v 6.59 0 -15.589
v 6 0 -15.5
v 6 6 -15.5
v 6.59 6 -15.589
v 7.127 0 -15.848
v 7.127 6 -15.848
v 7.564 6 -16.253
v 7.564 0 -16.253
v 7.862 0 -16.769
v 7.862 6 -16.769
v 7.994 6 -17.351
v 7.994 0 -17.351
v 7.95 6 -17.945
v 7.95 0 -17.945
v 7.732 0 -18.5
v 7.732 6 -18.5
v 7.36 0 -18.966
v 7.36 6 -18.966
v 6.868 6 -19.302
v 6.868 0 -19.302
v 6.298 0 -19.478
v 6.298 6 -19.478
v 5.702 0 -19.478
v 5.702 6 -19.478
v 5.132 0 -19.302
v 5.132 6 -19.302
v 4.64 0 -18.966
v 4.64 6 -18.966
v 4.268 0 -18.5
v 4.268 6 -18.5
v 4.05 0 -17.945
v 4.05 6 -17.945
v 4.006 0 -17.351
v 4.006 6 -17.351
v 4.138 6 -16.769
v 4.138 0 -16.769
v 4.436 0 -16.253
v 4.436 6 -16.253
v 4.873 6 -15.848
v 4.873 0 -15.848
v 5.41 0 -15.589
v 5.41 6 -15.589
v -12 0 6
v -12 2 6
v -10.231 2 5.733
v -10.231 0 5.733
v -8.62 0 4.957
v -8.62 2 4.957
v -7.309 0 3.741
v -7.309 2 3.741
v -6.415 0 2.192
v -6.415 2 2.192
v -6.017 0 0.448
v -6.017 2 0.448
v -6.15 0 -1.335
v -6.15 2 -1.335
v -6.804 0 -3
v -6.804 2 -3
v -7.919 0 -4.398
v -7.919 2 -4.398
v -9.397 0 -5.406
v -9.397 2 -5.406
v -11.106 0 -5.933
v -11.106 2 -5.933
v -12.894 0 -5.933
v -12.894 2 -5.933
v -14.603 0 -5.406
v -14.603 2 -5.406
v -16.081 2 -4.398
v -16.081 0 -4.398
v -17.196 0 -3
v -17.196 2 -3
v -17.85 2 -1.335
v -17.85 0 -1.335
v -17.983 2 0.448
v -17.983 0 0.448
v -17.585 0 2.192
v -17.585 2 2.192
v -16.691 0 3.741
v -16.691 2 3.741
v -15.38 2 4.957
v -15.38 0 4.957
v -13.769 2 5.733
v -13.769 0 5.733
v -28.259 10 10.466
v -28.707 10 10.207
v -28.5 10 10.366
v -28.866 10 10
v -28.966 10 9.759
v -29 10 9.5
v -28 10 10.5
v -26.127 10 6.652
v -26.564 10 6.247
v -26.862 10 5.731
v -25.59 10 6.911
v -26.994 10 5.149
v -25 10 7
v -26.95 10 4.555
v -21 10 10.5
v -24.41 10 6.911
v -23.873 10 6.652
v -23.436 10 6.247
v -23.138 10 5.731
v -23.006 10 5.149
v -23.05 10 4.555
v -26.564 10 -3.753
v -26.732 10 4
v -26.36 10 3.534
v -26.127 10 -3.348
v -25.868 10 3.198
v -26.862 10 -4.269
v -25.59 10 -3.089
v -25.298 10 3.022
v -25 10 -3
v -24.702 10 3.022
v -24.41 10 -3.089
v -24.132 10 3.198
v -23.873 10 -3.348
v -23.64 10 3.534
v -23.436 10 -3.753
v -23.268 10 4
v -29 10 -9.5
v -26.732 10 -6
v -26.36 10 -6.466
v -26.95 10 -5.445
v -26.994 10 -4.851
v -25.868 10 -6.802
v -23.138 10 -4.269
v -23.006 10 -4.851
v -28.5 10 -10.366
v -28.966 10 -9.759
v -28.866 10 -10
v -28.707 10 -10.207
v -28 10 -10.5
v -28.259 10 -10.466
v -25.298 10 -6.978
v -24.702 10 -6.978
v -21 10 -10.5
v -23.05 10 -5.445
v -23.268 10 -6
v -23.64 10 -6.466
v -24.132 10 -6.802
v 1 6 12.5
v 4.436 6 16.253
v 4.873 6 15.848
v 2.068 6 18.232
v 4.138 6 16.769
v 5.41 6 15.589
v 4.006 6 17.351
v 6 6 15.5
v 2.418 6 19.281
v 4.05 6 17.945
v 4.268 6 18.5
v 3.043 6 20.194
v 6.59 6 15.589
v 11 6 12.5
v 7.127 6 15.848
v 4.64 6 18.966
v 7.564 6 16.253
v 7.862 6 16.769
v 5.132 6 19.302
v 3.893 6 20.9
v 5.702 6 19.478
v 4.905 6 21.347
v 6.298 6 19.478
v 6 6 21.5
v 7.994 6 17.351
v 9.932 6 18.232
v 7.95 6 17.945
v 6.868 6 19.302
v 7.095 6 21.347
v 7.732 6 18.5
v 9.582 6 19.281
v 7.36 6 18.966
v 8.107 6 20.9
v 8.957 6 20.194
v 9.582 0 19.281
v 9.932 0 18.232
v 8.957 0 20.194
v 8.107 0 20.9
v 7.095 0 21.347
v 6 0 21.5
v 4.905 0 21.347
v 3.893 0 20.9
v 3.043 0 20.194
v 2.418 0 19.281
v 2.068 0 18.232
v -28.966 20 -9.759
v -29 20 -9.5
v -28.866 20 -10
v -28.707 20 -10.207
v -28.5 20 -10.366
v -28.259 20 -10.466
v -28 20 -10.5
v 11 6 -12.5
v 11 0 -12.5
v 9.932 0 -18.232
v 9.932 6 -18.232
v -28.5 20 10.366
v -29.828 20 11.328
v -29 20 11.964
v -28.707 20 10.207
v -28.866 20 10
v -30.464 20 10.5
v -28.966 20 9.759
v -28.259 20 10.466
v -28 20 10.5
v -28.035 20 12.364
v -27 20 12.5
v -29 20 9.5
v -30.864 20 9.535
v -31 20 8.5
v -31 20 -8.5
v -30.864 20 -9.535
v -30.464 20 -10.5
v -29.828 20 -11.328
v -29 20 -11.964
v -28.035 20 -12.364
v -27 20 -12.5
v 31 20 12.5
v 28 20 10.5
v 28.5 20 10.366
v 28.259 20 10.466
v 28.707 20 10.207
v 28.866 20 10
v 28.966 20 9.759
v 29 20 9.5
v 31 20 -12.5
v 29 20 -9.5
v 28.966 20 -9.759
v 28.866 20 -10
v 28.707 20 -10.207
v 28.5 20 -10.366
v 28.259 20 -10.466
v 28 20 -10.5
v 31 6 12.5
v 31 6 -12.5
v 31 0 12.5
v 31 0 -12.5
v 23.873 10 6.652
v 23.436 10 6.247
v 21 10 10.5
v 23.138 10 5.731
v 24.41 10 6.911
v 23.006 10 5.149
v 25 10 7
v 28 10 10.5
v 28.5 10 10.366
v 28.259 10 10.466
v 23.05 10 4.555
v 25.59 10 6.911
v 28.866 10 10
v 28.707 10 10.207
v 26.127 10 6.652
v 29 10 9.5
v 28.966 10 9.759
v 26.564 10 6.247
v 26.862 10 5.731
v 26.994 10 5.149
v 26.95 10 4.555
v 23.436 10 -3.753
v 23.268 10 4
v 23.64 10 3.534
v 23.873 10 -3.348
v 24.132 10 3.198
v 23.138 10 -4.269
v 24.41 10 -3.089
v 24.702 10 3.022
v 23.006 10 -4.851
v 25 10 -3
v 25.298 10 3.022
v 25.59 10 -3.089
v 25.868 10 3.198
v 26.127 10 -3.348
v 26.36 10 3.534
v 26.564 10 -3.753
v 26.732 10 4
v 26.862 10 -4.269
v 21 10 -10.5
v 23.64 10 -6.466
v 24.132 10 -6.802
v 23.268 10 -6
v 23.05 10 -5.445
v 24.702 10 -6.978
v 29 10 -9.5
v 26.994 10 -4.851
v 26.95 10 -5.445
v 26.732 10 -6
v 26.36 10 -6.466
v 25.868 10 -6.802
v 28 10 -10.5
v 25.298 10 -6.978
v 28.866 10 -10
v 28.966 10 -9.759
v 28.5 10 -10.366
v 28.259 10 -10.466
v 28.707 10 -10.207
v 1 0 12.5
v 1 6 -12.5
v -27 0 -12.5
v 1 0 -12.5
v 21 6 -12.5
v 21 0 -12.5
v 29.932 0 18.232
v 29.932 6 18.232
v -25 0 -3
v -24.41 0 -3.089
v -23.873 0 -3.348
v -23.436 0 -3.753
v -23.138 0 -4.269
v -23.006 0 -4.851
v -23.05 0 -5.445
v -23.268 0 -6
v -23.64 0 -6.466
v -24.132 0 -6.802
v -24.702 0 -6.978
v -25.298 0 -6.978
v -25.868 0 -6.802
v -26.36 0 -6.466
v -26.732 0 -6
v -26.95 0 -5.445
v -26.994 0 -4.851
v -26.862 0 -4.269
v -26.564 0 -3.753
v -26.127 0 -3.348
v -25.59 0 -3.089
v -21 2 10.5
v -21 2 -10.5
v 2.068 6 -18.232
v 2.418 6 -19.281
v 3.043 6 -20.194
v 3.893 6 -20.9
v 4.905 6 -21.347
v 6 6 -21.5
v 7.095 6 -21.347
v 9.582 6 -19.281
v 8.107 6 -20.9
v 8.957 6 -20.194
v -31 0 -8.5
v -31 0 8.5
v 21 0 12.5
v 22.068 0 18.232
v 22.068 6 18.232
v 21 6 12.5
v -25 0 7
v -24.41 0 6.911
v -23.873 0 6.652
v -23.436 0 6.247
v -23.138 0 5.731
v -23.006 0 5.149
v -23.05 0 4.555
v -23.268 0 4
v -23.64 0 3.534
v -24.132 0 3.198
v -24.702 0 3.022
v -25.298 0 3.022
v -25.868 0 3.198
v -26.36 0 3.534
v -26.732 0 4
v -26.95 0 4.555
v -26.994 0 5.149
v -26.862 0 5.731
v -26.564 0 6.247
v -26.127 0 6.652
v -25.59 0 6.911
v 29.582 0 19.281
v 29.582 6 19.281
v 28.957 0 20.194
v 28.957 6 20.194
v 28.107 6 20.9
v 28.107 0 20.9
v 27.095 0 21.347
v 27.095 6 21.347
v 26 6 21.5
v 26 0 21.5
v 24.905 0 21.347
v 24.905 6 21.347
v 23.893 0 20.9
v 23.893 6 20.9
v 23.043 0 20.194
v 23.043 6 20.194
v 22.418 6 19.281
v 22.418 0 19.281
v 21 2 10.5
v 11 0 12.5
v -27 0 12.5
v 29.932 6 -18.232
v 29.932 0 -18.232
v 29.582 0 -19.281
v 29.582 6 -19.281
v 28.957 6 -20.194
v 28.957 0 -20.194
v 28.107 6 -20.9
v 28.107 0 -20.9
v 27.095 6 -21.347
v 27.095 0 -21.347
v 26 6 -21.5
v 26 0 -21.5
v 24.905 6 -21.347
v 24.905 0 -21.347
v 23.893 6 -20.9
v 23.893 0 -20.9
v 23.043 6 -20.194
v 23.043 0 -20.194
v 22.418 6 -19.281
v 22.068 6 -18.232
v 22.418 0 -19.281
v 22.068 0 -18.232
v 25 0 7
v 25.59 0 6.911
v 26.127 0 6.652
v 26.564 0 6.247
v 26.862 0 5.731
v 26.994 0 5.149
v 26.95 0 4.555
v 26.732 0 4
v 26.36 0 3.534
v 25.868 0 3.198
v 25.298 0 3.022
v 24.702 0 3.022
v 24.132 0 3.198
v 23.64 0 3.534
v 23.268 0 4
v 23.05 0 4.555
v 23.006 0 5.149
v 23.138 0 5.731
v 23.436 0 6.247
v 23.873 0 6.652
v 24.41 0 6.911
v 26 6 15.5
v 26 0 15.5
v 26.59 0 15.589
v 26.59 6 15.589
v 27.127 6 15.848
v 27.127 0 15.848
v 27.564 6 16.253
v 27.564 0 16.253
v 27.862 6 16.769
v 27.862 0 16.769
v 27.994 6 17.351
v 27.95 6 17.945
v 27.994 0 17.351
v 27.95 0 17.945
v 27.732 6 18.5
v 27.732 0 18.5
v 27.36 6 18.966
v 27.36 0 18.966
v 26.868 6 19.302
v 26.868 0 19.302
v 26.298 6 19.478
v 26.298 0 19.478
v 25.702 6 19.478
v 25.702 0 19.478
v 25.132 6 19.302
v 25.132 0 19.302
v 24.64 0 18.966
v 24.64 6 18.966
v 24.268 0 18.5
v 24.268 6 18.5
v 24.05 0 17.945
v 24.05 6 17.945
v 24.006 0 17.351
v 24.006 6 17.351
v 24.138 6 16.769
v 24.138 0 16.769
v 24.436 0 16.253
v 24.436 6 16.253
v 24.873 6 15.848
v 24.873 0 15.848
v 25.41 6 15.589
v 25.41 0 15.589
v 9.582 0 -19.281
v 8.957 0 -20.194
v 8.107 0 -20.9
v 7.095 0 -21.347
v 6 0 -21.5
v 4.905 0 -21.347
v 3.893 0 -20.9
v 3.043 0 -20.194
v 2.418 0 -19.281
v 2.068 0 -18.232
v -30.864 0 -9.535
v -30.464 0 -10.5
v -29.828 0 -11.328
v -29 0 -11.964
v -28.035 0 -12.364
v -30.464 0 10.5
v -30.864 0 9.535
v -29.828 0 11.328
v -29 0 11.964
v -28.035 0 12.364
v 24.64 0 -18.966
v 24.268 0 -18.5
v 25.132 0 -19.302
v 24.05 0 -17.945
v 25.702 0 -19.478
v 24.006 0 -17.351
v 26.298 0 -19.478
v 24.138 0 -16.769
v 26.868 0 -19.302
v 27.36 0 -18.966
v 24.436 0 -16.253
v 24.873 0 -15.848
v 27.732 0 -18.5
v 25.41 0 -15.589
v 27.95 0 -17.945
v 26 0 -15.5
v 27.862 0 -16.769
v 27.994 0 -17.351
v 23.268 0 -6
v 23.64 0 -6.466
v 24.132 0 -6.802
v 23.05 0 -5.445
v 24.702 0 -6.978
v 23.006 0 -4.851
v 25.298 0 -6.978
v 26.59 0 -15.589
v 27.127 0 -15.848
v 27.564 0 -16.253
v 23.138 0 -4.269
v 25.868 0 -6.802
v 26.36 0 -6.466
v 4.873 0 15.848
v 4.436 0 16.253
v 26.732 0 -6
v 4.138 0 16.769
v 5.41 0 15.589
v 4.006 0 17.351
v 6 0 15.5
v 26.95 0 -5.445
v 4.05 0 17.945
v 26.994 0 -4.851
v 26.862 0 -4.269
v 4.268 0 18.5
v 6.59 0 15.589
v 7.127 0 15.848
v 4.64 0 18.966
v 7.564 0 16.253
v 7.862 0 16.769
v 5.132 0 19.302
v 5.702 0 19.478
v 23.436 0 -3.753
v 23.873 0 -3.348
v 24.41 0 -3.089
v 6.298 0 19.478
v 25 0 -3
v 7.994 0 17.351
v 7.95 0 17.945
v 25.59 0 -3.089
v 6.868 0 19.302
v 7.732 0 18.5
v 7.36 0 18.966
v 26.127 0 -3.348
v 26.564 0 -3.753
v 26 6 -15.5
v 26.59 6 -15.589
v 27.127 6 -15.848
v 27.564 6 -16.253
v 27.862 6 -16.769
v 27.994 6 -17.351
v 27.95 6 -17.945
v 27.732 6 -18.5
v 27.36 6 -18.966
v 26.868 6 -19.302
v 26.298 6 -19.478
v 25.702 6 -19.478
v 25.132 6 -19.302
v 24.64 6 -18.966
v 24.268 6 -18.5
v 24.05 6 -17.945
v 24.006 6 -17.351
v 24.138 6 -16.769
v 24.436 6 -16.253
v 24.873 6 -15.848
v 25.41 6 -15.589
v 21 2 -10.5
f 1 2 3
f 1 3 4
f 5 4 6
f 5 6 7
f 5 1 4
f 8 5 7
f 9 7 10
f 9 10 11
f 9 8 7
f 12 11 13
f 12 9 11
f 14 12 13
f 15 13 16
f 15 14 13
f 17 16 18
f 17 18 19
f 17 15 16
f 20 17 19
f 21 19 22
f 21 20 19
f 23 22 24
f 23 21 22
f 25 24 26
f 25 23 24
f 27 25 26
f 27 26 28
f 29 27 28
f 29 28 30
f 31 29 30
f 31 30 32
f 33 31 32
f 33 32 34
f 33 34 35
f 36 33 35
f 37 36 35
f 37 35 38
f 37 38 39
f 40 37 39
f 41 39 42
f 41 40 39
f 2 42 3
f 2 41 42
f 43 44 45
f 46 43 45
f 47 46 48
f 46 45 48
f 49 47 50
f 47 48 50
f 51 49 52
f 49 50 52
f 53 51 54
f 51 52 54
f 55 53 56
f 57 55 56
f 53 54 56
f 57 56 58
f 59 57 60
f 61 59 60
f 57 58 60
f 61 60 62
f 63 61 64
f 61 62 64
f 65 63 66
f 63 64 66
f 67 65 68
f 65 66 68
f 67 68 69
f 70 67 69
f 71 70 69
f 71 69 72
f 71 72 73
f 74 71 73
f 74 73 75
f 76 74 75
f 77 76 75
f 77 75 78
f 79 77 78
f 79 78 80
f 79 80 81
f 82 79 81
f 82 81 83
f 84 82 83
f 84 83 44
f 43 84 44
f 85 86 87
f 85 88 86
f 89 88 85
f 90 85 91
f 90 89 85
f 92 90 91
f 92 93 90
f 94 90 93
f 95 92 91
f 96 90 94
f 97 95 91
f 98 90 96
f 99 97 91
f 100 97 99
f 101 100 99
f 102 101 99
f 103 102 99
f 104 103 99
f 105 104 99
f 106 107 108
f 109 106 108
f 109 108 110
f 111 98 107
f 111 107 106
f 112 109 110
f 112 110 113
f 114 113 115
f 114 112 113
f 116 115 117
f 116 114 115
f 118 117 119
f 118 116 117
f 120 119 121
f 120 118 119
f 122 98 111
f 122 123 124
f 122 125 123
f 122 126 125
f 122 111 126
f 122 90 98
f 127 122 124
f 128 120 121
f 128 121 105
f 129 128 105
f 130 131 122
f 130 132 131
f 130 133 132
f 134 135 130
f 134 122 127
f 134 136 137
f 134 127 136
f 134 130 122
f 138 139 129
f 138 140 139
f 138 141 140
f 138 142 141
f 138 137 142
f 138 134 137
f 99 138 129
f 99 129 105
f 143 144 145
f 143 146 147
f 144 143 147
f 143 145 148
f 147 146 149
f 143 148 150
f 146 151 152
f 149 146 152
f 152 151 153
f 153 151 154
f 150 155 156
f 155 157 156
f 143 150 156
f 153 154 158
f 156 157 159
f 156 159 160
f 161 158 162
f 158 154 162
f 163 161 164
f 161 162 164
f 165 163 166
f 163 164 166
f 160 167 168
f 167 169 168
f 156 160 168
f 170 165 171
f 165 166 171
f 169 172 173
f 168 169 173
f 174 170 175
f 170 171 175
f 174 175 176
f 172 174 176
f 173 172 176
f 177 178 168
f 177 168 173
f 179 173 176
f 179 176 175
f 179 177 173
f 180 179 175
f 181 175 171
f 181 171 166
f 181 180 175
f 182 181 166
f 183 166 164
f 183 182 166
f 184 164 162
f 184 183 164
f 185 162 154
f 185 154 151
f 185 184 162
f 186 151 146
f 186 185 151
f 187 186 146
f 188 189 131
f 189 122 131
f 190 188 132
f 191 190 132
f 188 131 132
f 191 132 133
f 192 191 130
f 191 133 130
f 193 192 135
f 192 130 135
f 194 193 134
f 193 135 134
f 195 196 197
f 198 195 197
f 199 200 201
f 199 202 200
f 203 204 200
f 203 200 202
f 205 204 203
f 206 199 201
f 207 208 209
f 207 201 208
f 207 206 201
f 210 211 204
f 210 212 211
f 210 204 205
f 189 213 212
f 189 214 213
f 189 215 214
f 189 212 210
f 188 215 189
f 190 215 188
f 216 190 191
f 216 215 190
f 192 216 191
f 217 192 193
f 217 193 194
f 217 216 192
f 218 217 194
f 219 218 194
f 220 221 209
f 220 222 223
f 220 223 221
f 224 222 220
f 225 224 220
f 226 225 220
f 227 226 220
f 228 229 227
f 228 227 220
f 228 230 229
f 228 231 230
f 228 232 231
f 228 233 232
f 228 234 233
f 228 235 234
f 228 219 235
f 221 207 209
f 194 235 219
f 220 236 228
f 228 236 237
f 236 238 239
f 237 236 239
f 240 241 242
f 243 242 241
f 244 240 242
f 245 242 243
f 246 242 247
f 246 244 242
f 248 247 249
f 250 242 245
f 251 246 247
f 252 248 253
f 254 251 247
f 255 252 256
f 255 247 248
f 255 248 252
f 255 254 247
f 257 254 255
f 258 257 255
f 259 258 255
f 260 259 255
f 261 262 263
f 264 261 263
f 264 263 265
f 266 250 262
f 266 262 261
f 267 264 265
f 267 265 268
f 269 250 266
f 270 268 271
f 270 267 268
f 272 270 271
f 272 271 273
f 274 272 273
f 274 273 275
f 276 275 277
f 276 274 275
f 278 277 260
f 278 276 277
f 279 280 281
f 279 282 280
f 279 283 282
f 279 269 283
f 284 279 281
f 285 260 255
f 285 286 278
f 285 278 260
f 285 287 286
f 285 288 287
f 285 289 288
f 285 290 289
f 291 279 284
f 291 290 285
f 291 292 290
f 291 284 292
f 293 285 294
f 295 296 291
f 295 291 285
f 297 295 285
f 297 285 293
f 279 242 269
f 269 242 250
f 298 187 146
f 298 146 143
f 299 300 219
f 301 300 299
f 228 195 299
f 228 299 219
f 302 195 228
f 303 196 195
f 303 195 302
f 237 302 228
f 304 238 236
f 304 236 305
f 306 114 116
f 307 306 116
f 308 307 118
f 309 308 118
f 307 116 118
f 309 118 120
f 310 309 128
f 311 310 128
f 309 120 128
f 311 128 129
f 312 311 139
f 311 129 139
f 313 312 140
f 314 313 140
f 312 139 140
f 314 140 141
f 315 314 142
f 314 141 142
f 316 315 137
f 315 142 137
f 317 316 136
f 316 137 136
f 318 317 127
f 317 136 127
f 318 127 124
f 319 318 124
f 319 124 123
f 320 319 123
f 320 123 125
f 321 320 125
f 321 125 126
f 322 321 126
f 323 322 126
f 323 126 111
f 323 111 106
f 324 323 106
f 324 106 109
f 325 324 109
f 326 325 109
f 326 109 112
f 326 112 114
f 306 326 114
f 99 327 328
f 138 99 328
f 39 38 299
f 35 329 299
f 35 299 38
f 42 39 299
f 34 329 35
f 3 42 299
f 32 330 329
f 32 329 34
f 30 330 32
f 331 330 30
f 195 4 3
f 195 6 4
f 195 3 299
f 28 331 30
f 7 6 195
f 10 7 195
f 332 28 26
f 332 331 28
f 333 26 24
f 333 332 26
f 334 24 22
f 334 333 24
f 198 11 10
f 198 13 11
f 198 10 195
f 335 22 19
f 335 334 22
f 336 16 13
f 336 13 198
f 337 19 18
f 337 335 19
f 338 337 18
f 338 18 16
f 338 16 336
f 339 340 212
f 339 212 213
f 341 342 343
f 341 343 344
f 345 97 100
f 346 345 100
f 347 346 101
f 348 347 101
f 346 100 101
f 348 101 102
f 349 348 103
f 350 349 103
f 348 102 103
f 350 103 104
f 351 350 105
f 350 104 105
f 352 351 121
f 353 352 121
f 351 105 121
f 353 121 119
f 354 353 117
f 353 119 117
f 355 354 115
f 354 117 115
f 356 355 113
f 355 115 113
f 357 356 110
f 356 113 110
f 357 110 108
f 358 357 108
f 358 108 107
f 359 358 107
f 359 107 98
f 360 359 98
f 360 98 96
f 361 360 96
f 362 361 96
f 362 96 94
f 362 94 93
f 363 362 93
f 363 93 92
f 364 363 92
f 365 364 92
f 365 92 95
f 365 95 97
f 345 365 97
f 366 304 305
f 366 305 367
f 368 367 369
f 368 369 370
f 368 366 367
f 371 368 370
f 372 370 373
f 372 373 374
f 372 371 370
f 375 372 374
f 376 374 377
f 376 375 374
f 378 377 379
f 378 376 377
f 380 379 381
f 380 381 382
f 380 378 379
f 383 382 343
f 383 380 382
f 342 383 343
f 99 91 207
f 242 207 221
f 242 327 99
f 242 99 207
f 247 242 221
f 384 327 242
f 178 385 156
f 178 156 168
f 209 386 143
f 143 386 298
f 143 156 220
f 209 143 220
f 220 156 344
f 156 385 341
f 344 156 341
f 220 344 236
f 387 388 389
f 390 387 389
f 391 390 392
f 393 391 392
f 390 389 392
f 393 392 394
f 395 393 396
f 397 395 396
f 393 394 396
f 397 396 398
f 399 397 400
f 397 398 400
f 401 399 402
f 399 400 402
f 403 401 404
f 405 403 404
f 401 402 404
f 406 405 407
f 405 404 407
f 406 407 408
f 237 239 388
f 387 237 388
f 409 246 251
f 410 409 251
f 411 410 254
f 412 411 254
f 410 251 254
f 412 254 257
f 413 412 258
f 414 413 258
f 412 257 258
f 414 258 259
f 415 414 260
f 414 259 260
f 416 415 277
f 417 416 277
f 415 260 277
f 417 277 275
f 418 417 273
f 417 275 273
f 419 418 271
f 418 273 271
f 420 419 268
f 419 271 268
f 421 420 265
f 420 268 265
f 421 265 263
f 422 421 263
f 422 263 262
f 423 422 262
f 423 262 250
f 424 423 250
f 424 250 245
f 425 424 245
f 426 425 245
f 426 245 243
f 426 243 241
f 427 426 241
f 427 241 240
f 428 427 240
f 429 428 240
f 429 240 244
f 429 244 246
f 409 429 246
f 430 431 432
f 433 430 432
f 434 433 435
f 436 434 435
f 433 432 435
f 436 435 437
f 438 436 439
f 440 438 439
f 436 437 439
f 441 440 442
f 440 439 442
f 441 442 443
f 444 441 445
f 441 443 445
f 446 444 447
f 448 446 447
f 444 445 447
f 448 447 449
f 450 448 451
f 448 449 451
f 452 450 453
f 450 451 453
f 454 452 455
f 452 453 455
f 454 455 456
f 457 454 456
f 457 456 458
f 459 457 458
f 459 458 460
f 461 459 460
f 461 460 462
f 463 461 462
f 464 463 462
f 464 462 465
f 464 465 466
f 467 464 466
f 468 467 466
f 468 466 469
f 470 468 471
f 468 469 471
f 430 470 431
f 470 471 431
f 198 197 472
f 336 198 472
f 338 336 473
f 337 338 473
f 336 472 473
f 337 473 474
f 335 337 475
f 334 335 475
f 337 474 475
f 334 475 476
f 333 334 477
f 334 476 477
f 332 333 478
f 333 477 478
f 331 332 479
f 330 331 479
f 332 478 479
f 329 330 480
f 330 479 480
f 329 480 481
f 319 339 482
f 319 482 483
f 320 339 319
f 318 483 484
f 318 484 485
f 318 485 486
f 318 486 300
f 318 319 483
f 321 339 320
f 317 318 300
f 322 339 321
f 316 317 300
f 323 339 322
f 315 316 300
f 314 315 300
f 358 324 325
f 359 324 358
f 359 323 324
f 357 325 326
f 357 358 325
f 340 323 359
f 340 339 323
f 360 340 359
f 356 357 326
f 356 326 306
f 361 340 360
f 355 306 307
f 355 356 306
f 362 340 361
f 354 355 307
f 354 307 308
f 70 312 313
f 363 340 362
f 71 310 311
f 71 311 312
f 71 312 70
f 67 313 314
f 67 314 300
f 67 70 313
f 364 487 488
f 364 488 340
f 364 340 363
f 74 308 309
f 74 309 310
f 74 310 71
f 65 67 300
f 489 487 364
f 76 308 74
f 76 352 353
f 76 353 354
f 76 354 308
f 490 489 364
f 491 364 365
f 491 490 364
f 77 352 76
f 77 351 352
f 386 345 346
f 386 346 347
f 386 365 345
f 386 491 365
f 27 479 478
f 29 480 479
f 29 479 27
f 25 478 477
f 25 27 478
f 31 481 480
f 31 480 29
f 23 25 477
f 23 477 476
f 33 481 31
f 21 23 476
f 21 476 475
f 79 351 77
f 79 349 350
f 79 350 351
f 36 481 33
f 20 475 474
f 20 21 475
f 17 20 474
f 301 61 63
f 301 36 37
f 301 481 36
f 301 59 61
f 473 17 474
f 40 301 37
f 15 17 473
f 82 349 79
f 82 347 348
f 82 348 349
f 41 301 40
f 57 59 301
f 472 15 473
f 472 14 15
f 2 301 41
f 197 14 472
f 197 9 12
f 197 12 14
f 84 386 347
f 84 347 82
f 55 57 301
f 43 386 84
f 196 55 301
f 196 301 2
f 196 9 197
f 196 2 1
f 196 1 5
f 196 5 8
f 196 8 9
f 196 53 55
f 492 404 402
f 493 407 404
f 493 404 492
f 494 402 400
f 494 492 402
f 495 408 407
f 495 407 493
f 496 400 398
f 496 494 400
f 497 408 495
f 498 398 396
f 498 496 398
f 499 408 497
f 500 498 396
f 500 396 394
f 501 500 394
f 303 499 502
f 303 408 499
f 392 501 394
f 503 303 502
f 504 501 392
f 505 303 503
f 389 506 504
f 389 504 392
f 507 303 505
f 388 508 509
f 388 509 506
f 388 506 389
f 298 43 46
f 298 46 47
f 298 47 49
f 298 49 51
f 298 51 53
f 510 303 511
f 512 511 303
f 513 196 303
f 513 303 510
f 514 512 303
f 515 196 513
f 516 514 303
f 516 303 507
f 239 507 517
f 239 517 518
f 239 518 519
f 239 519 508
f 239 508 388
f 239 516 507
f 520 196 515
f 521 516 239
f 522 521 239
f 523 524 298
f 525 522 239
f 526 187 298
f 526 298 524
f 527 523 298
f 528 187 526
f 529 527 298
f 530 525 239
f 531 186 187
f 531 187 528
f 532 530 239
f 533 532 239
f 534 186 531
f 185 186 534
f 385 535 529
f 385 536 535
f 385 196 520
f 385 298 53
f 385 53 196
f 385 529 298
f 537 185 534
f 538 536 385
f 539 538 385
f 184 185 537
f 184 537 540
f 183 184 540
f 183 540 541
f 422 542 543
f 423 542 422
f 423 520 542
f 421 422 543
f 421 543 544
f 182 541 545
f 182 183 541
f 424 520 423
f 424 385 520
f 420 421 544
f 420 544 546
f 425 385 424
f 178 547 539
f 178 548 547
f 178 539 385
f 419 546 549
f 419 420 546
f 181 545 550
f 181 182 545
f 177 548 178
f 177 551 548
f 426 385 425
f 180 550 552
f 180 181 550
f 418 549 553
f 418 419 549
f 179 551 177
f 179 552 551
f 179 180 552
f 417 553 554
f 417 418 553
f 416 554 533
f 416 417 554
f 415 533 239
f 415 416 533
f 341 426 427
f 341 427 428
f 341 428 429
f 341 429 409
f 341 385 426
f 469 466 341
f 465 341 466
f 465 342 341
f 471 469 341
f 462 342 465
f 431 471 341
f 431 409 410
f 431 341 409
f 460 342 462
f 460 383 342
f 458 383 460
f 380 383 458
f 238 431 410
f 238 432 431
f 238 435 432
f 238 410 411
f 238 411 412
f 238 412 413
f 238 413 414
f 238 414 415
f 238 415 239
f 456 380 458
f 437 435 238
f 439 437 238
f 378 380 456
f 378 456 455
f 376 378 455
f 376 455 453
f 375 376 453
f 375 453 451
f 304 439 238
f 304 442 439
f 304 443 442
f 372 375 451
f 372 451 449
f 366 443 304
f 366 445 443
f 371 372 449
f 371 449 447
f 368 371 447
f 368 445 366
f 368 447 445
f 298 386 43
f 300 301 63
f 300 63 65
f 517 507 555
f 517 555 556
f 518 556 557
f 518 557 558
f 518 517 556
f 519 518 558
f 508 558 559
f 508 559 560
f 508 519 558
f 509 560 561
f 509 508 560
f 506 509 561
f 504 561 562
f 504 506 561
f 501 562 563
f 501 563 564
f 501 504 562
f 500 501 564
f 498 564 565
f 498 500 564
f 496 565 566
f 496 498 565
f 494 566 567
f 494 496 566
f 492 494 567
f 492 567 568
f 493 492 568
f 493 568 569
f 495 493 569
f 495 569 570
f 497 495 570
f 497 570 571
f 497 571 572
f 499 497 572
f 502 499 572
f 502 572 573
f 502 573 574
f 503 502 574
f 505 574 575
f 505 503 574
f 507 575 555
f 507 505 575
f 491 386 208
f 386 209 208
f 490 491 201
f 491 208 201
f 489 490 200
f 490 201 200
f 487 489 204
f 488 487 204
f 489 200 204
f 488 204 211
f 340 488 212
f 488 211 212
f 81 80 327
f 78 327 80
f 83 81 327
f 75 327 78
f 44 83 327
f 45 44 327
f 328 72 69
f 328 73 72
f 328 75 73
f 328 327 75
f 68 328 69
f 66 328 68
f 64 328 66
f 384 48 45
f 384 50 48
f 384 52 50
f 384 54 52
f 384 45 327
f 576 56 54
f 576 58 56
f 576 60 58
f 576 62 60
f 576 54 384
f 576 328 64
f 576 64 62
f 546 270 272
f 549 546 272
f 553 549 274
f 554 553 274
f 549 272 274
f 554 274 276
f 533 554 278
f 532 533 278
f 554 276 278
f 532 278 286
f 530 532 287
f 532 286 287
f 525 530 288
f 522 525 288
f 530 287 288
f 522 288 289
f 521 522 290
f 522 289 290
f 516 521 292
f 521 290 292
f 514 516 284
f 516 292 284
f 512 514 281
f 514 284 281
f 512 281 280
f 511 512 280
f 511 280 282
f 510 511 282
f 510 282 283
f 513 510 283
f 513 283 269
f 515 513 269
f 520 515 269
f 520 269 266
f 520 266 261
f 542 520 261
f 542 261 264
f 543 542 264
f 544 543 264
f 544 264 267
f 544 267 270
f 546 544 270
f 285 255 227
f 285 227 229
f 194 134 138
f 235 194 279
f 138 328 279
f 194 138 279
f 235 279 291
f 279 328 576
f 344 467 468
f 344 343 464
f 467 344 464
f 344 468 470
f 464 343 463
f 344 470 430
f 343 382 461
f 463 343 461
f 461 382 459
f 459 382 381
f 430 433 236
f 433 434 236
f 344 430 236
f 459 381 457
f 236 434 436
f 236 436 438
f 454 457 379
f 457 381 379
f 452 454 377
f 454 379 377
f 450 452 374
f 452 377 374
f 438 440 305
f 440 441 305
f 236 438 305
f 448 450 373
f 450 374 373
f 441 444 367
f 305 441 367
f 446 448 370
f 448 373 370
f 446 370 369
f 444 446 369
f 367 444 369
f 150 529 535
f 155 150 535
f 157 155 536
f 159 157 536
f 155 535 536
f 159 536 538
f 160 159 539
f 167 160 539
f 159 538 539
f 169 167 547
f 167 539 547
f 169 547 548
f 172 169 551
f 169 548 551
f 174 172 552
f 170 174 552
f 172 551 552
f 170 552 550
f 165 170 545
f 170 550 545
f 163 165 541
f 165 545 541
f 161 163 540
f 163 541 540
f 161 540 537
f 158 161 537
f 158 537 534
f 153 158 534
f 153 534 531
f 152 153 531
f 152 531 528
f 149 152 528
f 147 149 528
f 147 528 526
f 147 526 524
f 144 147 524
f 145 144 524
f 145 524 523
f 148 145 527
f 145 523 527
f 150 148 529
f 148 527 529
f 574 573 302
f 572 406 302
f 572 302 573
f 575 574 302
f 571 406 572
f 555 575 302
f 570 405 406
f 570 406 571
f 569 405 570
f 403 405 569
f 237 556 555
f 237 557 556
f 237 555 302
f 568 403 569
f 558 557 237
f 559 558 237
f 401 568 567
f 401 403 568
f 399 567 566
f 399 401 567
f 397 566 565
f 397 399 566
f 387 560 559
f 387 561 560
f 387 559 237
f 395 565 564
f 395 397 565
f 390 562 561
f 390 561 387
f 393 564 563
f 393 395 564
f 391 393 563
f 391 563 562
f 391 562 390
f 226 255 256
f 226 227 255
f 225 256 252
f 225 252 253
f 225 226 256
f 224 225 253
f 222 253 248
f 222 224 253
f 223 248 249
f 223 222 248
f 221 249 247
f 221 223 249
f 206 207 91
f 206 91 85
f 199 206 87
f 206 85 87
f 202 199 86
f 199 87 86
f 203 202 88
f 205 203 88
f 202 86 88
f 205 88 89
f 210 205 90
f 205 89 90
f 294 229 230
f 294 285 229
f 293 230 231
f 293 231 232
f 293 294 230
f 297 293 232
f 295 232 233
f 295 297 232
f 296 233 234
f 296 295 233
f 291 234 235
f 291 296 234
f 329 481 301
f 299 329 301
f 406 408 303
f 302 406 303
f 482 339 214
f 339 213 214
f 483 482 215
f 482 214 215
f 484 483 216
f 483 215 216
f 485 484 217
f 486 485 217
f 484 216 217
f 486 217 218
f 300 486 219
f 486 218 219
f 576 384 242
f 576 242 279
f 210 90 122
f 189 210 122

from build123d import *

# Parameters (mm, degrees)
SKETCH_1_W          = 62
SKETCH_1_H          = 25
EXTRUDE_1_DEPTH     = 20
SHELL_1_T           = -2
SKETCH_2_W          = 8
SKETCH_2_H          = 21
EXTRUDE_2_DEPTH     = 8
SKETCH_3_R          = 2
CUT_EXTRUDE_1_DEPTH = 35.889110049
SKETCH_4_R          = 6
CUT_EXTRUDE_2_DEPTH = 38.963798545
SKETCH_5_R          = 2
EXTRUDE_3_DEPTH     = 6
FILLET_1_R          = 4
FILLET_2_R          = 1


with BuildPart() as part:
    # 草图1 → 凸台-拉伸1 (new body)
    with BuildSketch(Plane(origin=(0, 0, 0), x_dir=(1, 0, 0), z_dir=(0, 1, 0))):
        Rectangle(SKETCH_1_W, SKETCH_1_H)
    extrude(amount=EXTRUDE_1_DEPTH)

    # 抽壳1
    shell_1_openings = [part.faces().sort_by_distance(p)[0] for p in [
        (0, 20, 0),
    ]]
    offset(amount=SHELL_1_T, openings=shell_1_openings, kind=Kind.INTERSECTION)

    # 草图2 → 凸台-拉伸2 (add)
    with BuildSketch(Plane(origin=(0, 2, 0), x_dir=(1, 0, 0), z_dir=(0, 1, 0))):
        with Locations((-25, 0)):
            Rectangle(SKETCH_2_W, SKETCH_2_H)
        with Locations((25, 0)):
            Rectangle(SKETCH_2_W, SKETCH_2_H)
    extrude(amount=EXTRUDE_2_DEPTH)

    # 草图3 → 切除-拉伸1 (cut, through all)
    with BuildSketch(Plane(origin=(0, 10, 0), x_dir=(1, 0, 0), z_dir=(0, 1, 0))):
        with Locations(Location((-25, 5, 0), (0, 0, 270))):
            Circle(SKETCH_3_R)
        with Locations(Location((-25, -5, 0), (0, 0, 270))):
            Circle(SKETCH_3_R)
        with Locations(Location((25, 5, 0), (0, 0, 270))):
            Circle(SKETCH_3_R)
        with Locations(Location((25, -5, 0), (0, 0, 270))):
            Circle(SKETCH_3_R)
    extrude(amount=-CUT_EXTRUDE_1_DEPTH, mode=Mode.SUBTRACT)

    # 草图4 → 切除-拉伸2 (cut, through all)
    with BuildSketch(Plane(origin=(0, 2, 0), x_dir=(1, 0, 0), z_dir=(0, 1, 0))):
        with Locations(Location((-12, 0, 0), (0, 0, 270))):
            Circle(SKETCH_4_R)
    extrude(amount=-CUT_EXTRUDE_2_DEPTH, mode=Mode.SUBTRACT)

    # 草图5 → 凸台-拉伸3 (add)
    # profile 1 of 2: a face of its own
    with BuildSketch(Plane(origin=(0, 0, 0), x_dir=(1, 0, 0), z_dir=(0, 1, 0))):
        with BuildLine():
            Line((22.067619242, 18.232380758), (21, 12.5))
            Line((21, 12.5), (31, 12.5))
            Line((31, 12.5), (29.932380758, 18.232380758))
            ThreePointArc((29.932380758, 18.232380758), (26, 21.5), (22.067619242, 18.232380758))
        make_face()
        with Locations(Location((26, 17.5, 0), (0, 0, 270))):
            Circle(SKETCH_5_R, mode=Mode.SUBTRACT)
    # profile 2 of 2: a face of its own
    with BuildSketch(Plane(origin=(0, 0, 0), x_dir=(1, 0, 0), z_dir=(0, 1, 0))):
        with BuildLine():
            Line((2.067619242, 18.232380758), (1, 12.5))
            Line((1, 12.5), (11, 12.5))
            Line((11, 12.5), (9.932380758, 18.232380758))
            ThreePointArc((9.932380758, 18.232380758), (6, 21.5), (2.067619242, 18.232380758))
        make_face()
        with Locations(Location((6, 17.5, 0), (0, 0, 270))):
            Circle(SKETCH_5_R, mode=Mode.SUBTRACT)
    extrude_3 = extrude(amount=EXTRUDE_3_DEPTH)

    # 镜向1: 凸台-拉伸3 across plane
    add(extrude_3.mirror(Plane.XY))

    # 圆角1
    fillet_1_edges = [part.edges().sort_by_distance(p)[0] for p in [
        (-31, 10, 12.5),
        (-31, 10, -12.5),
    ]]
    fillet(fillet_1_edges, radius=FILLET_1_R)

    # 圆角2
    fillet_2_edges = [part.edges().sort_by_distance(p)[0] for p in [
        (29, 15, 10.5),
        (29, 15, -10.5),
        (-29, 15, -10.5),
        (-29, 15, 10.5),
    ]]
    fillet(fillet_2_edges, radius=FILLET_2_R)


solid = part.part
